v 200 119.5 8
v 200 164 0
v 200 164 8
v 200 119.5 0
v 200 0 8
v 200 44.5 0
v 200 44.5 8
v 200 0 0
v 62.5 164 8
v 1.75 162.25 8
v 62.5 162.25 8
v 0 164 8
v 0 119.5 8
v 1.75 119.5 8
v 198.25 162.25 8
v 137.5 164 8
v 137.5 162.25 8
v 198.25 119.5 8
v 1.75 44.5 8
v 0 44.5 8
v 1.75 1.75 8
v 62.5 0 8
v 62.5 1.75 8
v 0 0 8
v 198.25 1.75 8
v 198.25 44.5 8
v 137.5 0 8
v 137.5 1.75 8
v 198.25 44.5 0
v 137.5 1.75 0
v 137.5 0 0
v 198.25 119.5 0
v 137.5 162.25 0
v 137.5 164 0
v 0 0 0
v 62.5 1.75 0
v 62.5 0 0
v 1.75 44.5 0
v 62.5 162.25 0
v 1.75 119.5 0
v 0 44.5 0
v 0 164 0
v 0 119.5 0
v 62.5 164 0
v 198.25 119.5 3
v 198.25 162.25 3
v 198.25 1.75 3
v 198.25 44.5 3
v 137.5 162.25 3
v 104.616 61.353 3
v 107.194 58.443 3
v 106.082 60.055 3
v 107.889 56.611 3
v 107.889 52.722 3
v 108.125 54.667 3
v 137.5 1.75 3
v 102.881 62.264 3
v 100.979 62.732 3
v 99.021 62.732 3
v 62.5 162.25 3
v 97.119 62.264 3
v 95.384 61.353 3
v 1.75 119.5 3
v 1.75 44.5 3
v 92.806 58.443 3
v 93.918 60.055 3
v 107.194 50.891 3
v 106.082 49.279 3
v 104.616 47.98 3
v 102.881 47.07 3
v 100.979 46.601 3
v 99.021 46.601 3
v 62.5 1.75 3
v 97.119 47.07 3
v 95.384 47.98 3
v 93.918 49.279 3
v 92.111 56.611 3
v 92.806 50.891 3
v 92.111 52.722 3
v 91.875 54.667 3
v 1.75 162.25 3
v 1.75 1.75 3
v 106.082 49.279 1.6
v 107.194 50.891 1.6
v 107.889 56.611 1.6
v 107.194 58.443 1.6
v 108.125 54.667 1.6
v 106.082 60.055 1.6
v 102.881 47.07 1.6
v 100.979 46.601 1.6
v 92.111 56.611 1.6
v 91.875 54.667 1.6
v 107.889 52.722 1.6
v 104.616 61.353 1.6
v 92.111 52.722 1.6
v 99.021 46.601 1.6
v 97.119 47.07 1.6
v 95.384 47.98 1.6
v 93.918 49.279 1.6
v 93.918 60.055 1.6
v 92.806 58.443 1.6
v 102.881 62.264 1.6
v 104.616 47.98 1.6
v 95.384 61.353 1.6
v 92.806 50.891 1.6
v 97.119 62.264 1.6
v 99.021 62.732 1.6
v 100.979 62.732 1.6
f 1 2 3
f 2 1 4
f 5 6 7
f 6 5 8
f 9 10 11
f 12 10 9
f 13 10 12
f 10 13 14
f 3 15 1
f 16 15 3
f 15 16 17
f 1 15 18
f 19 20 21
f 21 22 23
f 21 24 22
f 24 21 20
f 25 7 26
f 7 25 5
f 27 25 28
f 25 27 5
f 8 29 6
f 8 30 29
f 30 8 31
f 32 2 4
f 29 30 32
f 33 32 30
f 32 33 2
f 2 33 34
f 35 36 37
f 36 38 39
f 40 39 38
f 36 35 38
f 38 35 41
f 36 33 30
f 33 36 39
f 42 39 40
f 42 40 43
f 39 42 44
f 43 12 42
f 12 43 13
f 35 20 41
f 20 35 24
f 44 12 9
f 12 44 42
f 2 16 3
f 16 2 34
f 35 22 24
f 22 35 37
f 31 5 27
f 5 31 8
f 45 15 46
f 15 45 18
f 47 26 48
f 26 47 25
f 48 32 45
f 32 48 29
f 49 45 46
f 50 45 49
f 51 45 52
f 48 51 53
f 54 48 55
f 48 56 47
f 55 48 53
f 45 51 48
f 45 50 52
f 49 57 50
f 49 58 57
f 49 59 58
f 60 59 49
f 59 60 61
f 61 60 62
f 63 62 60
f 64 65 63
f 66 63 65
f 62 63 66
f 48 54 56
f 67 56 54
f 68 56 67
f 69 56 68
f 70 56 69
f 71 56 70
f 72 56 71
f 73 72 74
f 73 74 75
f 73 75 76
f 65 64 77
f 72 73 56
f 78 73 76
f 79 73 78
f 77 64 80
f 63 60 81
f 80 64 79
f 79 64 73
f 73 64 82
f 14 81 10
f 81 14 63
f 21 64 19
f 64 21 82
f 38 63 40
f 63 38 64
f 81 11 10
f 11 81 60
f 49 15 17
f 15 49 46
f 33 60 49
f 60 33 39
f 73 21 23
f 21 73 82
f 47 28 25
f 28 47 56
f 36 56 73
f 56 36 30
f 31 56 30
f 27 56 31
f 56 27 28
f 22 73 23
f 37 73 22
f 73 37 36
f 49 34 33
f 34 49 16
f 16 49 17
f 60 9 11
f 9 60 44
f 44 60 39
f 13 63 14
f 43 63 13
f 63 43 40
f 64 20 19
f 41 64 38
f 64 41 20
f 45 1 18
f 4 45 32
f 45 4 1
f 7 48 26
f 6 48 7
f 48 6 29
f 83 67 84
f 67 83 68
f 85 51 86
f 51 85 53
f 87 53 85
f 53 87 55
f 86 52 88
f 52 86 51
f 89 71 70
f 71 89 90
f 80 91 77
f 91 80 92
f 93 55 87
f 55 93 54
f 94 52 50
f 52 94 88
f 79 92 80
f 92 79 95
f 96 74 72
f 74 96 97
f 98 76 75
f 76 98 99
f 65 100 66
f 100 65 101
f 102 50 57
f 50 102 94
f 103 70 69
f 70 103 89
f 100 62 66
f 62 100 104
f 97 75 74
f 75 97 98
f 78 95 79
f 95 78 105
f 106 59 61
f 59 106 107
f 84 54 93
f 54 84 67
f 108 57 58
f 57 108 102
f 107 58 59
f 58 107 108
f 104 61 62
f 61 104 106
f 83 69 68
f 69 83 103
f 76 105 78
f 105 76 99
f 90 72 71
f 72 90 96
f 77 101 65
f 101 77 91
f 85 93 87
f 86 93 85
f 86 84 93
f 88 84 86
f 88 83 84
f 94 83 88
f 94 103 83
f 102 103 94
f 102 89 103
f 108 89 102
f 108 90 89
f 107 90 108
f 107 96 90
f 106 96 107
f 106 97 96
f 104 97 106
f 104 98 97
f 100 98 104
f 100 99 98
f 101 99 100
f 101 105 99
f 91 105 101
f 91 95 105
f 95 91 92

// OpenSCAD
length = 195;
width = 159;

height = 3;
rimHeight = 5;
rimThickness = 1.75;
notchLength = 75;
//Based on washer size:
washerDiameter = 16.25;
washerHeight = 1.4;
rimPadding = 1.5;
totalHeight = height + rimHeight;

totalLength = length + rimThickness * 2 + rimPadding;
totalWidth = width + rimThickness * 2 + rimPadding;
difference() {
    cube([totalLength, totalWidth, height + rimHeight]);
    translate([rimThickness, rimThickness, height])
        cube([length + rimPadding, width + rimPadding, rimHeight]);
    
    translate([totalLength/2 - notchLength/2, 0, 0])
        cube([notchLength, rimThickness, totalHeight]);
    translate([totalLength/2 - notchLength/2, totalWidth-rimThickness, 0])
        cube([notchLength, rimThickness, totalHeight]);


    translate([0, totalWidth/2 - notchLength/2, 0])
        cube([rimThickness, notchLength, totalHeight]);
    translate([totalLength-rimThickness, totalWidth/2 - notchLength/2, 0])
        cube([rimThickness, notchLength, totalHeight]);
    
    translate([totalLength/2, totalWidth/3, height - washerHeight])
        cylinder(washerHeight, d=washerDiameter);
}
